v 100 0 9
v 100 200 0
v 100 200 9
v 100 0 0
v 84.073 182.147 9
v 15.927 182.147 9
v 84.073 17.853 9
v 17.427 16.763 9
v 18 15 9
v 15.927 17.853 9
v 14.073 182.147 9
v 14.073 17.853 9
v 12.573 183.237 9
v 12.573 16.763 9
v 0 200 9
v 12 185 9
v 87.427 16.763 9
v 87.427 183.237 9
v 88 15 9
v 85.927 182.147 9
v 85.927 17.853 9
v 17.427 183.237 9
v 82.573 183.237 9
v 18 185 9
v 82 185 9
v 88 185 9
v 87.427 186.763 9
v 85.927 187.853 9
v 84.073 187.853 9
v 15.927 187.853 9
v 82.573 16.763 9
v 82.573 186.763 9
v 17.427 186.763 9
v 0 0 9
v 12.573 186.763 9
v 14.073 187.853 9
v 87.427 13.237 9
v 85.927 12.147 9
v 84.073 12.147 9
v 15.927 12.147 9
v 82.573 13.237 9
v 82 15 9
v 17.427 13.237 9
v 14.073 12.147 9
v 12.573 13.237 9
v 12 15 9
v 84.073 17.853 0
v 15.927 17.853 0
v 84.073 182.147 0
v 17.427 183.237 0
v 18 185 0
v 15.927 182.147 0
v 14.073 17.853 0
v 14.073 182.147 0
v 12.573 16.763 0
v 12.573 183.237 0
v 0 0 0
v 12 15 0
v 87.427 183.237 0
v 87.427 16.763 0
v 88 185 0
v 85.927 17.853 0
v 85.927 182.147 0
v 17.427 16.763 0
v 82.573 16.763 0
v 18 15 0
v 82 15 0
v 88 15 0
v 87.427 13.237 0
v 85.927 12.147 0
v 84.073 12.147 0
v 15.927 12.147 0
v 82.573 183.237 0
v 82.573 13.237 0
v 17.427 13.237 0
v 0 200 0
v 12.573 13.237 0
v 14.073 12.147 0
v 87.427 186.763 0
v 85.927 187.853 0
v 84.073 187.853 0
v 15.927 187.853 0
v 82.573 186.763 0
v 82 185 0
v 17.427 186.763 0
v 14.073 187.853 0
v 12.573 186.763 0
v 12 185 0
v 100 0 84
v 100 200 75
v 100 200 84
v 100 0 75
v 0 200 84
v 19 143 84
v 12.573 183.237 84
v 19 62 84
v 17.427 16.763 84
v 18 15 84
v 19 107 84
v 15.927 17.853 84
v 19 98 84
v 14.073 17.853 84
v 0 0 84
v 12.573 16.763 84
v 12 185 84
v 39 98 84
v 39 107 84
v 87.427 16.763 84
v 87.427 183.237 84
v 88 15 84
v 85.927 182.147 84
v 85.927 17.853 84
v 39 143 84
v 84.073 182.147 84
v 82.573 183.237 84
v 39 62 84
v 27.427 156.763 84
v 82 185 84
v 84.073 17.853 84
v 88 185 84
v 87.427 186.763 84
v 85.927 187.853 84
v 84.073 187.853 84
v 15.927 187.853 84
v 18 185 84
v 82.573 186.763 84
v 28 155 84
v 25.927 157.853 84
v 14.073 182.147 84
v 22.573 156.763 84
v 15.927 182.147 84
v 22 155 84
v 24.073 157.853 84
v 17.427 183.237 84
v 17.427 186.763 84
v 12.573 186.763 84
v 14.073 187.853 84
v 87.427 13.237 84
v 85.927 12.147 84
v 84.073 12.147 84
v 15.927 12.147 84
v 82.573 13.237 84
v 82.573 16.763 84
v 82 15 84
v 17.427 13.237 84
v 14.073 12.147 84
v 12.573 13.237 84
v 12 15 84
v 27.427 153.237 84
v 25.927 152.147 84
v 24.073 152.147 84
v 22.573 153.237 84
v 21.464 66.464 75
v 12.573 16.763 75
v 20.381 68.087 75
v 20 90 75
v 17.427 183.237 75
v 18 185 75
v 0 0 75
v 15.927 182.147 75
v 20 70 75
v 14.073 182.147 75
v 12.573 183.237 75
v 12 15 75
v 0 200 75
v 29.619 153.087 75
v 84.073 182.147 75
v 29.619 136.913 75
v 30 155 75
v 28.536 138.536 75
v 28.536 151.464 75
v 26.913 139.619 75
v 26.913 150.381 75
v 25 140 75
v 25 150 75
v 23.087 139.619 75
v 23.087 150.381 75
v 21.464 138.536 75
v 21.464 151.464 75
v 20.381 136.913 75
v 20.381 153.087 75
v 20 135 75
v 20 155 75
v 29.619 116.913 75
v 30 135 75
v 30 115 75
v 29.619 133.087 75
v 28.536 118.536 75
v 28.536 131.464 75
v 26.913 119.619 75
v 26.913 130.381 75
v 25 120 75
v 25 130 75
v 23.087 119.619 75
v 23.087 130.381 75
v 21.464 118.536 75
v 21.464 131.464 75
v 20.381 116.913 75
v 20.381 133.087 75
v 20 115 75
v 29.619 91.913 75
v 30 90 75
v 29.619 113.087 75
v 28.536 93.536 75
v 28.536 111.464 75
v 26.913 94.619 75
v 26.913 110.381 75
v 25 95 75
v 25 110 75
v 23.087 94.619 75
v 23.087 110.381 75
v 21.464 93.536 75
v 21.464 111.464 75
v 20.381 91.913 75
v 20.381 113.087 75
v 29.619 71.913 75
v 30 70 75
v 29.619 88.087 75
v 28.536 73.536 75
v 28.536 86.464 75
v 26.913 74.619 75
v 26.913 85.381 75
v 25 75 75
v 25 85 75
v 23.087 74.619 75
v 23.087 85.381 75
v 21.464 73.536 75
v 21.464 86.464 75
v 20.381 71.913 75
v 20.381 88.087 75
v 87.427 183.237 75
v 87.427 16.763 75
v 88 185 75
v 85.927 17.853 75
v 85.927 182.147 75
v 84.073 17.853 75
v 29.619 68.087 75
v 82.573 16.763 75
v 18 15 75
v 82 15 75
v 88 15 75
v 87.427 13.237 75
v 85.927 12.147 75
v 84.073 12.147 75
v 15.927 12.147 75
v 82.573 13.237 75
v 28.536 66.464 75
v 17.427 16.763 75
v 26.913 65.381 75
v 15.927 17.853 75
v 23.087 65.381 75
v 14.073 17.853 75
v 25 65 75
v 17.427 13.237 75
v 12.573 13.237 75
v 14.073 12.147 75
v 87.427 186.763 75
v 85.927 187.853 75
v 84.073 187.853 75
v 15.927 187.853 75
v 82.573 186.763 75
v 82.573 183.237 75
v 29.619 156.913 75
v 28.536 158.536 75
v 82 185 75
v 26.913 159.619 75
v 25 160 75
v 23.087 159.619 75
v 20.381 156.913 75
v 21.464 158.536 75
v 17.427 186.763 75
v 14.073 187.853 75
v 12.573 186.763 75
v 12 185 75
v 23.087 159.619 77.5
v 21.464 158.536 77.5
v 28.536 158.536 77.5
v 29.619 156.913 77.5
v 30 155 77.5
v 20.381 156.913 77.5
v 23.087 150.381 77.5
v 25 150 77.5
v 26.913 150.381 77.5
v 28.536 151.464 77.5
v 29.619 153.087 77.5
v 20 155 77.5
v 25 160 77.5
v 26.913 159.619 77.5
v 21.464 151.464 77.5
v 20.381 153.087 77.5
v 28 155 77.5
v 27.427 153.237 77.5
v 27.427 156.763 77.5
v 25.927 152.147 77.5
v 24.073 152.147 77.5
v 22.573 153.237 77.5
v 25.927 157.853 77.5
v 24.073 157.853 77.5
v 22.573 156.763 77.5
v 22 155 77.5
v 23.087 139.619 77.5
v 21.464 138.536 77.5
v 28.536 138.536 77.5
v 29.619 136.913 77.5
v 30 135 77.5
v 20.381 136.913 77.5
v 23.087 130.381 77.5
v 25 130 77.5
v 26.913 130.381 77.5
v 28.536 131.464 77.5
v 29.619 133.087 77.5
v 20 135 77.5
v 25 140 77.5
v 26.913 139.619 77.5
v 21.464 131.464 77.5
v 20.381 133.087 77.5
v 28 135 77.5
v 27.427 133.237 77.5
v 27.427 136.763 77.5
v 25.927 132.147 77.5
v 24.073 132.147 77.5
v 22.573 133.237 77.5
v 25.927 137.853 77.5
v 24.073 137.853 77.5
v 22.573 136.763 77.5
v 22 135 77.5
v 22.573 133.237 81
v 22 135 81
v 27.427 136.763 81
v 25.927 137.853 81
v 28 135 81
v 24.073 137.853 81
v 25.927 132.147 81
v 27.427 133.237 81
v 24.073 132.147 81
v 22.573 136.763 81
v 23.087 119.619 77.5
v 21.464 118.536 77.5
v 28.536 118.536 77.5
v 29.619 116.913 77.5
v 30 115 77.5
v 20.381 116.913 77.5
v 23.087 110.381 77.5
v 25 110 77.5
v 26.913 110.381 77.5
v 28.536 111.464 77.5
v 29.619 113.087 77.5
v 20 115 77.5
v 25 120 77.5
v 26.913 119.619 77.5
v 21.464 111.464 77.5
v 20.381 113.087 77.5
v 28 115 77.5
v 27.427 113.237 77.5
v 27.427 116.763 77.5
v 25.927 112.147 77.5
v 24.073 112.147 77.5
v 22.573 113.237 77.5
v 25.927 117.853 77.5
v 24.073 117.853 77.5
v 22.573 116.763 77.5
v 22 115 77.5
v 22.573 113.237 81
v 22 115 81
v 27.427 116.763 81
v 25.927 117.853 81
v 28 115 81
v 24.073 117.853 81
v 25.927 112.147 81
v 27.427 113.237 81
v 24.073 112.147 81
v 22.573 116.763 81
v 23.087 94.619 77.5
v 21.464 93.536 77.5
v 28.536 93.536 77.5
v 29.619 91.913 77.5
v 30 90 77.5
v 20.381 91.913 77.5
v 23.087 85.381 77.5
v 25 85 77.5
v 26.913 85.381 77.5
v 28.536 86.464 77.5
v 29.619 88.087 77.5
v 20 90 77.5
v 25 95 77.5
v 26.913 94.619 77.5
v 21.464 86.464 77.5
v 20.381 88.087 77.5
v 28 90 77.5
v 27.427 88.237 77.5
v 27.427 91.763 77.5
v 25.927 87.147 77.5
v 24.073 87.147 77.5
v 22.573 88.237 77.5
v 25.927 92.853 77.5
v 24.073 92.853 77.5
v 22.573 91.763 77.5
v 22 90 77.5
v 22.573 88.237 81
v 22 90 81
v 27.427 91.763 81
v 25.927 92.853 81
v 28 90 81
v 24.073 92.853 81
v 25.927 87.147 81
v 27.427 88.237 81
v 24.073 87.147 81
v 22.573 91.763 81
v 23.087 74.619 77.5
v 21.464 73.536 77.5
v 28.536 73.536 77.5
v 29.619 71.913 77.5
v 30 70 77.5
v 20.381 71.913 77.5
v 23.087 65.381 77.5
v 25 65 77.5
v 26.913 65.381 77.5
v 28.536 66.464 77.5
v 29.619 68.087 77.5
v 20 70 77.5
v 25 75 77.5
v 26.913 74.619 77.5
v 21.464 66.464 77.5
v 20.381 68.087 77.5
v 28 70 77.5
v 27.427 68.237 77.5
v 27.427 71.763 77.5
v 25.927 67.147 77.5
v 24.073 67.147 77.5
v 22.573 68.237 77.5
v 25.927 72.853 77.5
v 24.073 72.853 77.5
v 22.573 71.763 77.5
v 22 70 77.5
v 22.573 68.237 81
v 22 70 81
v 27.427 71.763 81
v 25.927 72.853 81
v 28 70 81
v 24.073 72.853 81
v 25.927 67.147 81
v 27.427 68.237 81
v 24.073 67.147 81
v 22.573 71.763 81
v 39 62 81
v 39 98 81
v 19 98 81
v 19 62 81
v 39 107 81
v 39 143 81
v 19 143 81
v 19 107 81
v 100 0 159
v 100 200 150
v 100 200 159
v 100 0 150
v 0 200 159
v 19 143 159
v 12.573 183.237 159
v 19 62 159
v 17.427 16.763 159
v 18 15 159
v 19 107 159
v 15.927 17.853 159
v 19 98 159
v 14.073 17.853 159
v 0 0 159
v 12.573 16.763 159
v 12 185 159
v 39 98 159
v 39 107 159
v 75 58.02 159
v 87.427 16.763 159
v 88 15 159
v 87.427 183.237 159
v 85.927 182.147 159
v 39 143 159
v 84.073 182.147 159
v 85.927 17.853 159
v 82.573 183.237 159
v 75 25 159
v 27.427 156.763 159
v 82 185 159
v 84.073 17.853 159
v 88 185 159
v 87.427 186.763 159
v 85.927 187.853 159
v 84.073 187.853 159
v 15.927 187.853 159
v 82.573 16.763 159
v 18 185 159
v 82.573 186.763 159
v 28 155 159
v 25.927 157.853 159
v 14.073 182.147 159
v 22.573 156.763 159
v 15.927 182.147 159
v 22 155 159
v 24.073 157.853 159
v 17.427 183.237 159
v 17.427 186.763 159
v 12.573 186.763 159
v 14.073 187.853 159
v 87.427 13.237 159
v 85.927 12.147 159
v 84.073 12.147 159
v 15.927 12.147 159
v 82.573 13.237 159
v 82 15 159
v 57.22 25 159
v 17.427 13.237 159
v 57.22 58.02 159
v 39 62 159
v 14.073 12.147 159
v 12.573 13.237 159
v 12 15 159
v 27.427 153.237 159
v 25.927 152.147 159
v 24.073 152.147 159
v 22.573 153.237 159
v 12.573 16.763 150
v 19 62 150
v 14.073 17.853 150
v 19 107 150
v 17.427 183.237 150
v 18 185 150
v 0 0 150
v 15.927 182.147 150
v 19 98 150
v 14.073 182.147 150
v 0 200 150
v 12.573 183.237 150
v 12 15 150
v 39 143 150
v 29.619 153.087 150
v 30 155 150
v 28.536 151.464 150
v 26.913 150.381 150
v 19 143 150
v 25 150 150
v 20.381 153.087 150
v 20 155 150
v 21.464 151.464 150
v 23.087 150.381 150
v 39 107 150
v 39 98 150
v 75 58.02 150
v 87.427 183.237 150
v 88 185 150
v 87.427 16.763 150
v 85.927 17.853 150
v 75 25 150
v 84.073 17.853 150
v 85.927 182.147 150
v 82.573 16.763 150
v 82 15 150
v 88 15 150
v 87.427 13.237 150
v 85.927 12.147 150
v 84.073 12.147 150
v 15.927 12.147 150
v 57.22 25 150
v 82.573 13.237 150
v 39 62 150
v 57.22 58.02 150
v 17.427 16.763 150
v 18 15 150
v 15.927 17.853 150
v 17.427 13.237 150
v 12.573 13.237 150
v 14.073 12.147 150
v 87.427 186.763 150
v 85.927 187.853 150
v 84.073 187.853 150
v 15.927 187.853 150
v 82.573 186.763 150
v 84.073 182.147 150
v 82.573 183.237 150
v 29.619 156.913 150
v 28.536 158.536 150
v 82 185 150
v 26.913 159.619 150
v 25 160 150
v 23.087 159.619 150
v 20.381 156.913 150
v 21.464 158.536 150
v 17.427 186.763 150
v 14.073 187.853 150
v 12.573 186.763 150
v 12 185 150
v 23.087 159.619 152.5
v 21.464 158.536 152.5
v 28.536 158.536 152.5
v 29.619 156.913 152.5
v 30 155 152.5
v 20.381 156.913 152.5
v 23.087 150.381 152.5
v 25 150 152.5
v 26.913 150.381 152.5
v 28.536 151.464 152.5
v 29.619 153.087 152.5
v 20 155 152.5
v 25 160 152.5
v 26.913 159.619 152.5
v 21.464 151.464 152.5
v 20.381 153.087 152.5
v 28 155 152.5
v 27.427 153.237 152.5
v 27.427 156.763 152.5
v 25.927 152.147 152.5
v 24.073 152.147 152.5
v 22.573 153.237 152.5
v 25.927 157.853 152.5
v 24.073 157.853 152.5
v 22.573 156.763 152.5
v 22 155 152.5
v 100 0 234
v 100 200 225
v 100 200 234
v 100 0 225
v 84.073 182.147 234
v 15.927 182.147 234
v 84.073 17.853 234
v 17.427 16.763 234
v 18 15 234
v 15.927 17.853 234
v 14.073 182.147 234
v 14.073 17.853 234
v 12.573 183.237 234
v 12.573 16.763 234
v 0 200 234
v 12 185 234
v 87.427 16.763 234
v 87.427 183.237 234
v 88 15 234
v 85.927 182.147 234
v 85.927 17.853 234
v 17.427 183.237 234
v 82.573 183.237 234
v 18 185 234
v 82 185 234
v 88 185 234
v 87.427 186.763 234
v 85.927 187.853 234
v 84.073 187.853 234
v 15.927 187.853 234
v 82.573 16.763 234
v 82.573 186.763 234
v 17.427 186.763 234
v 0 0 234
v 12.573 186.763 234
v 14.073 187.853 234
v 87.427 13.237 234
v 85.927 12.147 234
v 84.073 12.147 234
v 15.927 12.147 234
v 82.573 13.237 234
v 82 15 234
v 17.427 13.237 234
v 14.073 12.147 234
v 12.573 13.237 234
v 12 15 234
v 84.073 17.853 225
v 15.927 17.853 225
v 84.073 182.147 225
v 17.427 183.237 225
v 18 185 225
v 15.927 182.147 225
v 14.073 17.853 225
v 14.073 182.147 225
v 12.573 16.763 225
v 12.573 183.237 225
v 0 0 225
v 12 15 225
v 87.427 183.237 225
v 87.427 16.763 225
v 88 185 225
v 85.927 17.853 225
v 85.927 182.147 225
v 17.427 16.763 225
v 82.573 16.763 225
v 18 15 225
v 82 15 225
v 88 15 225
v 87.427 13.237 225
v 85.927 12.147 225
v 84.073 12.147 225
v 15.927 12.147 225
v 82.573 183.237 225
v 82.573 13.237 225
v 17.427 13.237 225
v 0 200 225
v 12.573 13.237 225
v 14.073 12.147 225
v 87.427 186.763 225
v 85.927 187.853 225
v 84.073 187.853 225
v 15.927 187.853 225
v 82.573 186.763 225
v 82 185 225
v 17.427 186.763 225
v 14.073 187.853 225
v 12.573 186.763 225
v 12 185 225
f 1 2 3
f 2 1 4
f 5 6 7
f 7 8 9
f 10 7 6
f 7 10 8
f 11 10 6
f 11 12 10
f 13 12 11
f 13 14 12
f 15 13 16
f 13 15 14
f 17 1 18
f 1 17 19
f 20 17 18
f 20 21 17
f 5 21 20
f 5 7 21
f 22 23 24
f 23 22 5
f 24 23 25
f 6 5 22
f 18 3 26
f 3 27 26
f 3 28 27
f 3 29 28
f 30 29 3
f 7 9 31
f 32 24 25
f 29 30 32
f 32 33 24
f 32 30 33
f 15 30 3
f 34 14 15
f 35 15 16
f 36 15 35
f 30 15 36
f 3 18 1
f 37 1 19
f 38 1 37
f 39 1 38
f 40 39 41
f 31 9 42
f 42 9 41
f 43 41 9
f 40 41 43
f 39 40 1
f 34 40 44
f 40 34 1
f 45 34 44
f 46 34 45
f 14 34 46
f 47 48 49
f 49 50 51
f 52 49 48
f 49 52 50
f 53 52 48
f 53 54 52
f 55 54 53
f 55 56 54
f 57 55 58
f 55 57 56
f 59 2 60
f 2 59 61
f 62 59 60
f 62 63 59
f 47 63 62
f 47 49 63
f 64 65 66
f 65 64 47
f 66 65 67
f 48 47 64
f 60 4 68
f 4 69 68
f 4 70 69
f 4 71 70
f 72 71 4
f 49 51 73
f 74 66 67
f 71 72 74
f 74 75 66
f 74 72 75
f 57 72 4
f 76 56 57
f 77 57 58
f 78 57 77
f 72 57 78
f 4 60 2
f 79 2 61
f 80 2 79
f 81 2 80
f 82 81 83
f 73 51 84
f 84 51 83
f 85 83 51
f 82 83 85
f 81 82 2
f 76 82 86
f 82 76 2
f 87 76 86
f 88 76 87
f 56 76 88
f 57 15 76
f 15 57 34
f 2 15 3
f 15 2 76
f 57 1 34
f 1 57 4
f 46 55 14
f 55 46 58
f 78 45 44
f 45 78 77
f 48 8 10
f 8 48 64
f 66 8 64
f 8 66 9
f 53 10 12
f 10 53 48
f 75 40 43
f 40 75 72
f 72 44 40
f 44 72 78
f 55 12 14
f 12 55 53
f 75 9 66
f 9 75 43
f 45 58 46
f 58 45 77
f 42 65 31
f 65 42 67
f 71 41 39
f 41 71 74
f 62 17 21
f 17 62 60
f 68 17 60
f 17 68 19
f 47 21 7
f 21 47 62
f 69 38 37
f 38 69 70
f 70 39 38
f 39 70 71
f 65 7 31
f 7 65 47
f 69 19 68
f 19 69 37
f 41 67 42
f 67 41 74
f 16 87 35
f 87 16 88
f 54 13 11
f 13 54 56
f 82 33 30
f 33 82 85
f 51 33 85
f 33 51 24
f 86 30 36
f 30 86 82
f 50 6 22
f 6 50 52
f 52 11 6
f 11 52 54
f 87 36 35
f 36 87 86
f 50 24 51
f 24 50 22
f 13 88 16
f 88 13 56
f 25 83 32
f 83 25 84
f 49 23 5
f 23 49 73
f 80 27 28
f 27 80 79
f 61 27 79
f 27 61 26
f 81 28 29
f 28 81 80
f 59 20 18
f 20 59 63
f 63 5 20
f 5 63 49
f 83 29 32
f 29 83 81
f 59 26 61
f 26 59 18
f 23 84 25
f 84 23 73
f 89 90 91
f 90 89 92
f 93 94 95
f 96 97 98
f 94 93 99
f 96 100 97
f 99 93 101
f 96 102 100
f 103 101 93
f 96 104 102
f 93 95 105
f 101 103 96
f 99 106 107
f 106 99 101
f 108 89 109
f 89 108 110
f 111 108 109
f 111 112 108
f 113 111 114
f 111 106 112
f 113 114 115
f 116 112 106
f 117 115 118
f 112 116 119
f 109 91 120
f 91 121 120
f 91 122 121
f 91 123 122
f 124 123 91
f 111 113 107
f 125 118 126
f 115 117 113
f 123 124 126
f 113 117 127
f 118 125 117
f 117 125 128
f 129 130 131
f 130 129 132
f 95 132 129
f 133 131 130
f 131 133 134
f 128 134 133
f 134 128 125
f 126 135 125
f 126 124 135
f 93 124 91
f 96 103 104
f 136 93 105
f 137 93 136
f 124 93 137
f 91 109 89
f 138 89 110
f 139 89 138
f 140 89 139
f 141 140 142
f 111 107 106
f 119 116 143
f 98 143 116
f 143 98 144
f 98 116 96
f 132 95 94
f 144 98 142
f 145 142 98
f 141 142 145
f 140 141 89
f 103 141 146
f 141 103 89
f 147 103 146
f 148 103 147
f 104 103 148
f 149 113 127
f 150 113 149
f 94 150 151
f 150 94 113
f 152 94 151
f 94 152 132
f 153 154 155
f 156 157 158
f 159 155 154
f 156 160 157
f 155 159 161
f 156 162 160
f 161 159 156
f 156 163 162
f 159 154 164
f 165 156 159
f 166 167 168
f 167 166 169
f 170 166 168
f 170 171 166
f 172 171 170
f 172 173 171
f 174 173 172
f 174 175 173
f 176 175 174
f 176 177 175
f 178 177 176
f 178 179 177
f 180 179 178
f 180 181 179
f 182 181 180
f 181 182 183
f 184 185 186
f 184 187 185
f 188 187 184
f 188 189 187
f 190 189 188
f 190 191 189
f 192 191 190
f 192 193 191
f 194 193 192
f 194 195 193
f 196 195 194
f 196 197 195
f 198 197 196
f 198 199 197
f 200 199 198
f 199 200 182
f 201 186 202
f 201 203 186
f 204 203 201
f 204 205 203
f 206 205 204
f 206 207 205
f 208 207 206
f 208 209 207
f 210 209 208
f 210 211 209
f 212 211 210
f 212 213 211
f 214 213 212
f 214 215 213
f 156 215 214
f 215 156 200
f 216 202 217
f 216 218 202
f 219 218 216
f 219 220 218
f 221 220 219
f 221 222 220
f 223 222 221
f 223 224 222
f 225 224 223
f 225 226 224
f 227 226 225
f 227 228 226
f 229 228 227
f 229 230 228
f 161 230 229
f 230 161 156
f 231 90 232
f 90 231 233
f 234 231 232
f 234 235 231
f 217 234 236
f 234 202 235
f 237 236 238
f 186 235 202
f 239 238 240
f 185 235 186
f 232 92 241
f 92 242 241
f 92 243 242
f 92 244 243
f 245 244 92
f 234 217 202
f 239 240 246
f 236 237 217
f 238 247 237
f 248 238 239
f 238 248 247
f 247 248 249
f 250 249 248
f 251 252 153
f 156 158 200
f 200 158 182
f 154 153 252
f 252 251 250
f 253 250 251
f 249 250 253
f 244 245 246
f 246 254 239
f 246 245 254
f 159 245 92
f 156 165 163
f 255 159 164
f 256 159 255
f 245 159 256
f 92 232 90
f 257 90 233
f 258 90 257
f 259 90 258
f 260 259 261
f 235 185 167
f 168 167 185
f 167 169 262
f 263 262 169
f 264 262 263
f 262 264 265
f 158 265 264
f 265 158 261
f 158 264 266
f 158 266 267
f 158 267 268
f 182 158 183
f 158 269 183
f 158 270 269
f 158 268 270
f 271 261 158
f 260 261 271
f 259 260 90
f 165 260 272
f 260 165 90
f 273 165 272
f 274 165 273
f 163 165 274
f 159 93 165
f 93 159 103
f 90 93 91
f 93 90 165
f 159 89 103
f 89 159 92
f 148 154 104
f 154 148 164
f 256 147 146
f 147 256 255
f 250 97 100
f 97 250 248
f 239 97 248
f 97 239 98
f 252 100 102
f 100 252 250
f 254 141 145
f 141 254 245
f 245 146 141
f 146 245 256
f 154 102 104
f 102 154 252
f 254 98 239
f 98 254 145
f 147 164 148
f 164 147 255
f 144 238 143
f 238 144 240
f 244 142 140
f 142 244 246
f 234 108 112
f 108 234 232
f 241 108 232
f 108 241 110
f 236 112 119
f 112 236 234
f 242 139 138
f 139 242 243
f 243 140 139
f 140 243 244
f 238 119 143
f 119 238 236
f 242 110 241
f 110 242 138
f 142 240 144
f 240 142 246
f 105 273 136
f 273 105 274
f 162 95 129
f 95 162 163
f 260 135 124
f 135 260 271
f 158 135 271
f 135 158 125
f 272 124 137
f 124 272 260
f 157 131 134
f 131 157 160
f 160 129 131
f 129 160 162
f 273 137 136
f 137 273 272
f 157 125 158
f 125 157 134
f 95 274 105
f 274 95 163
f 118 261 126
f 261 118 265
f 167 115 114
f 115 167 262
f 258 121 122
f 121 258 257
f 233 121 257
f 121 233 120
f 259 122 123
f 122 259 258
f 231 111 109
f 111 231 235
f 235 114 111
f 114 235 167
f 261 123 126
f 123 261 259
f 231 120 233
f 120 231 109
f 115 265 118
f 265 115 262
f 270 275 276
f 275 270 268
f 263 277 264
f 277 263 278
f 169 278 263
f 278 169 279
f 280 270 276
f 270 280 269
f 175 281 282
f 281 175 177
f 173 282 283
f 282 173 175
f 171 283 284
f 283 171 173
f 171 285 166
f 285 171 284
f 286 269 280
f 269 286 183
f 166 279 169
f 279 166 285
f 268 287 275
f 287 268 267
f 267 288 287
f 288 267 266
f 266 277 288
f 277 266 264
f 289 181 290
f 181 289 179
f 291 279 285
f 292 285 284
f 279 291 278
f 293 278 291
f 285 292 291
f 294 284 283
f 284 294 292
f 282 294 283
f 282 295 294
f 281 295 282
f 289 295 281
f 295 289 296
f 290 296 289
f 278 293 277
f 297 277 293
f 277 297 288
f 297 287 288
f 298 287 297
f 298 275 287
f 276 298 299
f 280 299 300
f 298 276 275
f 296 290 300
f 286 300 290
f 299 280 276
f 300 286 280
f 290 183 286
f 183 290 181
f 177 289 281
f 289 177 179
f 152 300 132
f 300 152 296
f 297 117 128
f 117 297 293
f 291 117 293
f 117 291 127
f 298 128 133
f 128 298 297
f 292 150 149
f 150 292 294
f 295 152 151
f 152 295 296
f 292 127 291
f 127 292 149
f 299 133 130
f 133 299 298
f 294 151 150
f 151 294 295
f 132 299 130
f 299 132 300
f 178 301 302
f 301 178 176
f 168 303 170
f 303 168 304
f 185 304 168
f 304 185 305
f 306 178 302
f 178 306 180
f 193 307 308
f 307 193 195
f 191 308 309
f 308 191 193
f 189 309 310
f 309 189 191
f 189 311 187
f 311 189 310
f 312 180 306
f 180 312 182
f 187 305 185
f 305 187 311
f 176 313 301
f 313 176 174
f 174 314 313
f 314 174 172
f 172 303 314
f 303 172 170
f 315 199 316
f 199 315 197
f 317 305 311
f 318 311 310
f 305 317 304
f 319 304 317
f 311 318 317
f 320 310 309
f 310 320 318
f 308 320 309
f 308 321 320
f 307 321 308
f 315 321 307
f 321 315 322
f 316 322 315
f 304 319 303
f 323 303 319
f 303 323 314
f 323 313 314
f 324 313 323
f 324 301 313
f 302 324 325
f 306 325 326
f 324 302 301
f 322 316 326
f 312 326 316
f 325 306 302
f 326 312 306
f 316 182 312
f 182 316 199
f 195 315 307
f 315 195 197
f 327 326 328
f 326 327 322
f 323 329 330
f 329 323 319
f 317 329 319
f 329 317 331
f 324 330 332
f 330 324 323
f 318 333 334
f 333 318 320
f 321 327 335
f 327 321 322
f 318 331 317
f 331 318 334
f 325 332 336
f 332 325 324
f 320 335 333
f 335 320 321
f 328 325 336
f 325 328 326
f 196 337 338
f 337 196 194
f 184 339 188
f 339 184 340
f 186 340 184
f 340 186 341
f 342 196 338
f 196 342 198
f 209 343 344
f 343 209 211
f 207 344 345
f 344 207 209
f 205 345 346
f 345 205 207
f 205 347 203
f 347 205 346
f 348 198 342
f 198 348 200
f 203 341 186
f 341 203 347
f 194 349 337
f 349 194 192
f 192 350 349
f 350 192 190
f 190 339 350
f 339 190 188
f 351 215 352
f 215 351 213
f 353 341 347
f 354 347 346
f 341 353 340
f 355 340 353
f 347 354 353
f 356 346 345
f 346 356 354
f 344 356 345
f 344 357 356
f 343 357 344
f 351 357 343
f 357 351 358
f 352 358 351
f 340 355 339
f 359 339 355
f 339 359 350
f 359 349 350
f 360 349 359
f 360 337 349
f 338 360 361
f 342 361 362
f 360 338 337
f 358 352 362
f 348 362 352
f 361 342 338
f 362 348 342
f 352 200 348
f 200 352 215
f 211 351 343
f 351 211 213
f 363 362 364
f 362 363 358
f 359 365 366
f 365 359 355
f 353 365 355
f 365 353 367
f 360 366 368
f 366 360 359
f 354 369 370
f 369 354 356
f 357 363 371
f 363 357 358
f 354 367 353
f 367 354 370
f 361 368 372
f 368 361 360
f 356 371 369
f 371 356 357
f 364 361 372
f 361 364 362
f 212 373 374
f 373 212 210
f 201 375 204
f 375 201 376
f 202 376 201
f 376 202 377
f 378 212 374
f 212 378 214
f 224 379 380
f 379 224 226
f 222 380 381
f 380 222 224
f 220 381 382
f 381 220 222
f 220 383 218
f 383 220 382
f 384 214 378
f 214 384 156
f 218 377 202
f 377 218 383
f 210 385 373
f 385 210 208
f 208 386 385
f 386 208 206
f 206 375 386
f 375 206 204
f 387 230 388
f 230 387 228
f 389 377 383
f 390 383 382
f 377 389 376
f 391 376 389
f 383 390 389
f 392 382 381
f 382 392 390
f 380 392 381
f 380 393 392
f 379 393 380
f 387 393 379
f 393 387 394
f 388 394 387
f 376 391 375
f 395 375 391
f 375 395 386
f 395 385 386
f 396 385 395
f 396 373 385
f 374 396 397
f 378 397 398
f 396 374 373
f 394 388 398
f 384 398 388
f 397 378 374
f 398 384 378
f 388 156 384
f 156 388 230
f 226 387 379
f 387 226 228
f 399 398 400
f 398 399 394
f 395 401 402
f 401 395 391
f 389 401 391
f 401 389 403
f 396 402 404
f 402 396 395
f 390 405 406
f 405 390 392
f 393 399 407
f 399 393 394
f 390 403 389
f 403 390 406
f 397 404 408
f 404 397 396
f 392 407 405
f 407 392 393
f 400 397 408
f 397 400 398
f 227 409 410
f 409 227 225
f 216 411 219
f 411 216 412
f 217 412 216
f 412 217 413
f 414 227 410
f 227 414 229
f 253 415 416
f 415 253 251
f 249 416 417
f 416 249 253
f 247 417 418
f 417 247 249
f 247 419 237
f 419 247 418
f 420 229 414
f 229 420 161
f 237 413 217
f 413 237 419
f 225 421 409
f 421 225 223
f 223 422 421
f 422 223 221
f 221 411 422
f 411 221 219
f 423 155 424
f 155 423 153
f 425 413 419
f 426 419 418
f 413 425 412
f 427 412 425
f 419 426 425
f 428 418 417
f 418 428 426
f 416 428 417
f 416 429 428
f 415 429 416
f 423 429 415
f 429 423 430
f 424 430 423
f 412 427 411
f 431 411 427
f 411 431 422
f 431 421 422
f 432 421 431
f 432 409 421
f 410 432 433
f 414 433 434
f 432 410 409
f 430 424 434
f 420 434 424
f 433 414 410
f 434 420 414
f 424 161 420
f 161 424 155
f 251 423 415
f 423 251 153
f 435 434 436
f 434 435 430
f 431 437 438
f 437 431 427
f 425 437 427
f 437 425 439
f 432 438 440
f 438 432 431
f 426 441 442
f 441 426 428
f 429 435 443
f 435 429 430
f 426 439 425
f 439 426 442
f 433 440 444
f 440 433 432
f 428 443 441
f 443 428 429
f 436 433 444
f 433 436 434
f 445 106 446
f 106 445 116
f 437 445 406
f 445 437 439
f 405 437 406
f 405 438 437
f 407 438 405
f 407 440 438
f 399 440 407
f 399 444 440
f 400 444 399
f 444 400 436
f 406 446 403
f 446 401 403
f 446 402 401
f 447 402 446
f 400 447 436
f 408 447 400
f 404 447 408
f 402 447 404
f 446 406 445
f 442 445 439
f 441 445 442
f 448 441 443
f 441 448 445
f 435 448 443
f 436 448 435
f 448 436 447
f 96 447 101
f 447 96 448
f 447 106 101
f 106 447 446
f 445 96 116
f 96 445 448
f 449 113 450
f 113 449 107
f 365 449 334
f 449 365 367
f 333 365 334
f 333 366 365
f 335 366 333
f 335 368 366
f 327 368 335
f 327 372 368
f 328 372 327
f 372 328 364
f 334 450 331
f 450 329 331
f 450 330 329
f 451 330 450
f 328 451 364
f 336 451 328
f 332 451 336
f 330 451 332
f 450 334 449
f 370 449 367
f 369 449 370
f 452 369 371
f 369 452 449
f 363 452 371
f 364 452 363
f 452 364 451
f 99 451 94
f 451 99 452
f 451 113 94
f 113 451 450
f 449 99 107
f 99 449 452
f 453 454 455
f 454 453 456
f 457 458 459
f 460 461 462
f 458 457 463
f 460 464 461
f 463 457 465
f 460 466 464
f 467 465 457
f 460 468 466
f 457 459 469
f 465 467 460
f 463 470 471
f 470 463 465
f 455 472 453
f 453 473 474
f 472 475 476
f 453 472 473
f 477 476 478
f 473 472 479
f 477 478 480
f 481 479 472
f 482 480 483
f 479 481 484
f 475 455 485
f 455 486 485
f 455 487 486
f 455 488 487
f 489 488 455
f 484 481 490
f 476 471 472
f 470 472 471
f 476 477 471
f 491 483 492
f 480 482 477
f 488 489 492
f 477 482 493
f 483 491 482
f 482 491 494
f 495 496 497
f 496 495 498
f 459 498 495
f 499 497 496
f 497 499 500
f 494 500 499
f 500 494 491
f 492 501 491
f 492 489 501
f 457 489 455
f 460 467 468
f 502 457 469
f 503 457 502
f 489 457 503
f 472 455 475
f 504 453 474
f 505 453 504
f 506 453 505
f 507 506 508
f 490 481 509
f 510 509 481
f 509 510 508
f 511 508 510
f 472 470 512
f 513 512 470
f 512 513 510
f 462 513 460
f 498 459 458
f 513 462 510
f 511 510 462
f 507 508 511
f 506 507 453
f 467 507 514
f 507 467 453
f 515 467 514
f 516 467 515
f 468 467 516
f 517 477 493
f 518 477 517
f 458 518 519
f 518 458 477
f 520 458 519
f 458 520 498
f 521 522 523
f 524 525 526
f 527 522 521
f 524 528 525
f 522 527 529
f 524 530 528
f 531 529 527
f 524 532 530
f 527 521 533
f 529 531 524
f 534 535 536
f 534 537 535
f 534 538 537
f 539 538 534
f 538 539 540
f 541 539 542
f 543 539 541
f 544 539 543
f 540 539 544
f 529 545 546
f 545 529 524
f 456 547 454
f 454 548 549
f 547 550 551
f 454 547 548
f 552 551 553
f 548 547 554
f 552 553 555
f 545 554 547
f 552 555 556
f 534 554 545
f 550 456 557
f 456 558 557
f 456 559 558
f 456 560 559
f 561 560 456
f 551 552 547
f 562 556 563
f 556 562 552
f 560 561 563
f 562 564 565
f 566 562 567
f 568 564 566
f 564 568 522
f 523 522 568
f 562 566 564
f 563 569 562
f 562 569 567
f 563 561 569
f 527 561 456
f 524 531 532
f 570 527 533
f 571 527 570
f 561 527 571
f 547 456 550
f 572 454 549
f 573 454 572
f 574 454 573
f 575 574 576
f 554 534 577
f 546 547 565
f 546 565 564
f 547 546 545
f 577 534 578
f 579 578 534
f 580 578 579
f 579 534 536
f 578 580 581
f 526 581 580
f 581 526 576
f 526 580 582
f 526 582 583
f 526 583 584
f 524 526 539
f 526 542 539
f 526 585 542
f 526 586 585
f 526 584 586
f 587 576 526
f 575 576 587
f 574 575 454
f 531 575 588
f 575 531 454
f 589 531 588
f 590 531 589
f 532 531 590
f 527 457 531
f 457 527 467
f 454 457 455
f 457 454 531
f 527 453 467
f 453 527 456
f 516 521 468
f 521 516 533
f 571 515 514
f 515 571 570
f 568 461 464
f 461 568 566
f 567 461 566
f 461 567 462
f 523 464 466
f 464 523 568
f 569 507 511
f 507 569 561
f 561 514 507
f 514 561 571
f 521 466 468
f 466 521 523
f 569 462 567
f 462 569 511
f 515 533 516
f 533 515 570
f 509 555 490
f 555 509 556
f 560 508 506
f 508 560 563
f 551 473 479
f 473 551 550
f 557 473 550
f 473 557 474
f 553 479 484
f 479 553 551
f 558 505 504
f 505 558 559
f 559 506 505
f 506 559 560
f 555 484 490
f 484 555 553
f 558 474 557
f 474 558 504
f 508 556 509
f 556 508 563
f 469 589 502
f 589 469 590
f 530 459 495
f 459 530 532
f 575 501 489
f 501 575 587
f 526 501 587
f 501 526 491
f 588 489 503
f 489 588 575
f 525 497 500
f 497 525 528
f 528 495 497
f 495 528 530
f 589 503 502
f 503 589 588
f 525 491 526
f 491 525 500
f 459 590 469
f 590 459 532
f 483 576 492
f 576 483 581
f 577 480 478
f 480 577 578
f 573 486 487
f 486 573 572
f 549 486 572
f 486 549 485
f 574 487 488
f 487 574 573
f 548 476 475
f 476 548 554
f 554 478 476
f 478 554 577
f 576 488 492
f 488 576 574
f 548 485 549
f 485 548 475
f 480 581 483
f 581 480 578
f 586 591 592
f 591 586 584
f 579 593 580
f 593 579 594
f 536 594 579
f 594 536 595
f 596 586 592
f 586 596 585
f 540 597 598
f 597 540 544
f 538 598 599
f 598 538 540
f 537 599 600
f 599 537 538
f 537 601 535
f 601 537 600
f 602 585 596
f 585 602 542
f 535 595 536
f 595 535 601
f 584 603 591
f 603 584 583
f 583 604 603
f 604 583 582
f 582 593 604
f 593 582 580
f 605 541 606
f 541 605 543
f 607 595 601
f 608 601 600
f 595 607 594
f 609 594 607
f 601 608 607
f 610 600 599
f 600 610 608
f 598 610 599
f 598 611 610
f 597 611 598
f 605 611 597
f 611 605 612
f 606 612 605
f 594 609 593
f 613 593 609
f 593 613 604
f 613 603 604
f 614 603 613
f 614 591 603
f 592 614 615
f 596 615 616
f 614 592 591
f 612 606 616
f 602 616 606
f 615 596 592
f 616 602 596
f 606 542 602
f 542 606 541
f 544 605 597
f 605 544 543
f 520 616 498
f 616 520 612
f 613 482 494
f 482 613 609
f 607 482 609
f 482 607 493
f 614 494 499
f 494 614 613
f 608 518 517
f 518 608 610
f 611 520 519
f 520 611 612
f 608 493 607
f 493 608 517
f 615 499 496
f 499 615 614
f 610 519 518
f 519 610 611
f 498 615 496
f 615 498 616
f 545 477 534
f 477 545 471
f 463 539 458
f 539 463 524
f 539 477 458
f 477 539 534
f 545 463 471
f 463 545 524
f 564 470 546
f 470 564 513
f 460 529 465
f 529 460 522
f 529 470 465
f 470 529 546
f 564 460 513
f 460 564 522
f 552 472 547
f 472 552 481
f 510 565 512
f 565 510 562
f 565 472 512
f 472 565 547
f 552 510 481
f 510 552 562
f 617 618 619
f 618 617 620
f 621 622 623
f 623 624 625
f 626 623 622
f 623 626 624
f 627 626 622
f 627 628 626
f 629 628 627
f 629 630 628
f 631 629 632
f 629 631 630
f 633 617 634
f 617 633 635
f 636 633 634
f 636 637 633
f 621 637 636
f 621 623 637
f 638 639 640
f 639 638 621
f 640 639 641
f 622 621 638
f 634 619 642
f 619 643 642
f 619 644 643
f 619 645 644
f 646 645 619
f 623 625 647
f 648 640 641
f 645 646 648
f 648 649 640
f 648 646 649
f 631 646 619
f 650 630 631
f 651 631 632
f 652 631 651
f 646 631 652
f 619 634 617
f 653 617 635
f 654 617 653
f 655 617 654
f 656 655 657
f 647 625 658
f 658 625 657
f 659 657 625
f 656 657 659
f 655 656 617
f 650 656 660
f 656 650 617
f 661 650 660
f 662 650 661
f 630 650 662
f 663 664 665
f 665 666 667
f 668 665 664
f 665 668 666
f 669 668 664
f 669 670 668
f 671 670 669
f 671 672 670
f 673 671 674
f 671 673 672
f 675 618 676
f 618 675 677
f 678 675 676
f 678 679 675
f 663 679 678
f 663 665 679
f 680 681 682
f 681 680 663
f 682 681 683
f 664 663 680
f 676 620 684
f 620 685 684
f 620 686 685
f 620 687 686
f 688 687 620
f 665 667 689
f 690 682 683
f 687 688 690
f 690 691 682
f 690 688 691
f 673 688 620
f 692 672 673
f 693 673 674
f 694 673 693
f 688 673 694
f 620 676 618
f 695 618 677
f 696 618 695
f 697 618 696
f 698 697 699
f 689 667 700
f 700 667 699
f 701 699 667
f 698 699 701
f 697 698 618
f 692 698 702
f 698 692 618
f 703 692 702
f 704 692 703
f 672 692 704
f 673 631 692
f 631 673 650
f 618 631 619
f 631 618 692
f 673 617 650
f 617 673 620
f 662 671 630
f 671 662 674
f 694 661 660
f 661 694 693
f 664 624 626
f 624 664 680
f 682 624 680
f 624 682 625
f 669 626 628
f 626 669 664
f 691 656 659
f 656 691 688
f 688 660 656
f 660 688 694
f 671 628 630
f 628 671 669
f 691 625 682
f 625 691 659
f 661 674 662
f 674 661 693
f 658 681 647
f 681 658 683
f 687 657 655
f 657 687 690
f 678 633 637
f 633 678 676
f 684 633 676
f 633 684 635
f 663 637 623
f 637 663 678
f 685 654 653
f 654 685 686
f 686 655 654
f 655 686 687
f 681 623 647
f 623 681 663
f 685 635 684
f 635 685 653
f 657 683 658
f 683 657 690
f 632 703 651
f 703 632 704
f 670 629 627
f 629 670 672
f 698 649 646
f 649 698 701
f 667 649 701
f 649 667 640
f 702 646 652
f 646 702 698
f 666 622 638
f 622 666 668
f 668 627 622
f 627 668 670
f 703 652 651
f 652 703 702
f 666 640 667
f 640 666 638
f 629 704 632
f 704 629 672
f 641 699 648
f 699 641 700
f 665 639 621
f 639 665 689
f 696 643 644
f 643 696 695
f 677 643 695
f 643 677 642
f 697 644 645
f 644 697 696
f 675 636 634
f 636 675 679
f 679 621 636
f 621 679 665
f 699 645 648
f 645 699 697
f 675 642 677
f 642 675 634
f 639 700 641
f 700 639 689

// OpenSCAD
/* Tufnol board for protection diode and current sensors for my Land Rover. */

board_thickness = 9;
board_height = 200;
board_width = 100;

sensor_height = 36;		/* todo: measure */
sensor_width = 20;		/* todo: measure */
sensor_bolt_spacing = 20;	/* todo: measure */
sensor_bolt_x_offset = 6;	/* todo: measure */
sensor_bolt_y_offset = (sensor_height - sensor_bolt_spacing) / 2;

sensor_base_depth = 3;

gap_between_sensors = 25;

diagram_spacing = 75;

diode_input_x = 25;
diode_input_y = board_height - 45;

diode_length = 20;		/* todo: measure */

arduino_height = 1.3 * 25.4;
arduino_width = 0.7 * 25.4;

arduino_x_position = board_width - (arduino_width + 25);
arduino_y_position = 25;

bolt_length = 20;
bolt_diameter = 6;		/* todo: measure */
bolt_head_thickness = 5;	/* todo: measure */
bolt_head_diameter = 10;	/* todo: measure */

mounting_hole_offset = 15;

module one_board()
{
     difference() {
	  cube(size=[board_width, board_height, board_thickness]);
	  translate([mounting_hole_offset, mounting_hole_offset])
	       cylinder(h=board_thickness, r=bolt_diameter/2);
	  translate([board_width - mounting_hole_offset, mounting_hole_offset])
	       cylinder(h=board_thickness, r=bolt_diameter/2);
	  translate([mounting_hole_offset, board_height - mounting_hole_offset])
	       cylinder(h=board_thickness, r=bolt_diameter/2);
	  translate([board_width - mounting_hole_offset, board_height - mounting_hole_offset])
	       cylinder(h=board_thickness, r=bolt_diameter/2);
     }
}

module bolt_cutout()
{
     union() {
	  cylinder(h=bolt_head_thickness, r=bolt_head_diameter/2, center=true);
	  translate([0,0,bolt_head_thickness]) cylinder(h=bolt_length, r=bolt_diameter/2, center=true);
     }
}

module sensor_cutout()
{
     translate([-sensor_bolt_x_offset, -sensor_height+sensor_bolt_y_offset])
	  cube(size=[sensor_width, sensor_height, board_thickness]);
}

module arduino_cutout()
{
     cube(size=[arduino_width, arduino_height, board_thickness]);
}

module base_board()
{
     one_board();
}

module lower_board()
{
     difference() {
	  one_board();
	  translate([diode_input_x, diode_input_y]) {
	       bolt_cutout();
	       translate([0, -diode_length]) {
		    bolt_cutout();
		    translate([0,0,board_thickness-sensor_base_depth]) sensor_cutout();
		    translate([0,-sensor_bolt_spacing]) {
			 bolt_cutout();
			 translate([0,-gap_between_sensors]) {
			      bolt_cutout();
			      translate([0,0,board_thickness-sensor_base_depth]) sensor_cutout();
			      translate([0, -sensor_bolt_spacing]) {
				   bolt_cutout();
			      }
			 }
		    }
	       }
	  }
     }
}

module middle_board()
{
     difference() {
	  one_board();
	  translate([diode_input_x, diode_input_y]) {
	       bolt_cutout();
	       translate([0, -diode_length]) {
		    sensor_cutout();
		    translate([0,-sensor_bolt_spacing]) {
			 translate([0,-gap_between_sensors]) {
			      sensor_cutout();
			 }
		    }
	       }
	  }
	  translate([arduino_x_position, arduino_y_position]) arduino_cutout();
     }
}

module upper_board()
{
     one_board();
}

base_board();
translate([0,0,diagram_spacing]) lower_board();
translate([0,0,2*diagram_spacing]) middle_board();
translate([0,0,3*diagram_spacing]) upper_board();
